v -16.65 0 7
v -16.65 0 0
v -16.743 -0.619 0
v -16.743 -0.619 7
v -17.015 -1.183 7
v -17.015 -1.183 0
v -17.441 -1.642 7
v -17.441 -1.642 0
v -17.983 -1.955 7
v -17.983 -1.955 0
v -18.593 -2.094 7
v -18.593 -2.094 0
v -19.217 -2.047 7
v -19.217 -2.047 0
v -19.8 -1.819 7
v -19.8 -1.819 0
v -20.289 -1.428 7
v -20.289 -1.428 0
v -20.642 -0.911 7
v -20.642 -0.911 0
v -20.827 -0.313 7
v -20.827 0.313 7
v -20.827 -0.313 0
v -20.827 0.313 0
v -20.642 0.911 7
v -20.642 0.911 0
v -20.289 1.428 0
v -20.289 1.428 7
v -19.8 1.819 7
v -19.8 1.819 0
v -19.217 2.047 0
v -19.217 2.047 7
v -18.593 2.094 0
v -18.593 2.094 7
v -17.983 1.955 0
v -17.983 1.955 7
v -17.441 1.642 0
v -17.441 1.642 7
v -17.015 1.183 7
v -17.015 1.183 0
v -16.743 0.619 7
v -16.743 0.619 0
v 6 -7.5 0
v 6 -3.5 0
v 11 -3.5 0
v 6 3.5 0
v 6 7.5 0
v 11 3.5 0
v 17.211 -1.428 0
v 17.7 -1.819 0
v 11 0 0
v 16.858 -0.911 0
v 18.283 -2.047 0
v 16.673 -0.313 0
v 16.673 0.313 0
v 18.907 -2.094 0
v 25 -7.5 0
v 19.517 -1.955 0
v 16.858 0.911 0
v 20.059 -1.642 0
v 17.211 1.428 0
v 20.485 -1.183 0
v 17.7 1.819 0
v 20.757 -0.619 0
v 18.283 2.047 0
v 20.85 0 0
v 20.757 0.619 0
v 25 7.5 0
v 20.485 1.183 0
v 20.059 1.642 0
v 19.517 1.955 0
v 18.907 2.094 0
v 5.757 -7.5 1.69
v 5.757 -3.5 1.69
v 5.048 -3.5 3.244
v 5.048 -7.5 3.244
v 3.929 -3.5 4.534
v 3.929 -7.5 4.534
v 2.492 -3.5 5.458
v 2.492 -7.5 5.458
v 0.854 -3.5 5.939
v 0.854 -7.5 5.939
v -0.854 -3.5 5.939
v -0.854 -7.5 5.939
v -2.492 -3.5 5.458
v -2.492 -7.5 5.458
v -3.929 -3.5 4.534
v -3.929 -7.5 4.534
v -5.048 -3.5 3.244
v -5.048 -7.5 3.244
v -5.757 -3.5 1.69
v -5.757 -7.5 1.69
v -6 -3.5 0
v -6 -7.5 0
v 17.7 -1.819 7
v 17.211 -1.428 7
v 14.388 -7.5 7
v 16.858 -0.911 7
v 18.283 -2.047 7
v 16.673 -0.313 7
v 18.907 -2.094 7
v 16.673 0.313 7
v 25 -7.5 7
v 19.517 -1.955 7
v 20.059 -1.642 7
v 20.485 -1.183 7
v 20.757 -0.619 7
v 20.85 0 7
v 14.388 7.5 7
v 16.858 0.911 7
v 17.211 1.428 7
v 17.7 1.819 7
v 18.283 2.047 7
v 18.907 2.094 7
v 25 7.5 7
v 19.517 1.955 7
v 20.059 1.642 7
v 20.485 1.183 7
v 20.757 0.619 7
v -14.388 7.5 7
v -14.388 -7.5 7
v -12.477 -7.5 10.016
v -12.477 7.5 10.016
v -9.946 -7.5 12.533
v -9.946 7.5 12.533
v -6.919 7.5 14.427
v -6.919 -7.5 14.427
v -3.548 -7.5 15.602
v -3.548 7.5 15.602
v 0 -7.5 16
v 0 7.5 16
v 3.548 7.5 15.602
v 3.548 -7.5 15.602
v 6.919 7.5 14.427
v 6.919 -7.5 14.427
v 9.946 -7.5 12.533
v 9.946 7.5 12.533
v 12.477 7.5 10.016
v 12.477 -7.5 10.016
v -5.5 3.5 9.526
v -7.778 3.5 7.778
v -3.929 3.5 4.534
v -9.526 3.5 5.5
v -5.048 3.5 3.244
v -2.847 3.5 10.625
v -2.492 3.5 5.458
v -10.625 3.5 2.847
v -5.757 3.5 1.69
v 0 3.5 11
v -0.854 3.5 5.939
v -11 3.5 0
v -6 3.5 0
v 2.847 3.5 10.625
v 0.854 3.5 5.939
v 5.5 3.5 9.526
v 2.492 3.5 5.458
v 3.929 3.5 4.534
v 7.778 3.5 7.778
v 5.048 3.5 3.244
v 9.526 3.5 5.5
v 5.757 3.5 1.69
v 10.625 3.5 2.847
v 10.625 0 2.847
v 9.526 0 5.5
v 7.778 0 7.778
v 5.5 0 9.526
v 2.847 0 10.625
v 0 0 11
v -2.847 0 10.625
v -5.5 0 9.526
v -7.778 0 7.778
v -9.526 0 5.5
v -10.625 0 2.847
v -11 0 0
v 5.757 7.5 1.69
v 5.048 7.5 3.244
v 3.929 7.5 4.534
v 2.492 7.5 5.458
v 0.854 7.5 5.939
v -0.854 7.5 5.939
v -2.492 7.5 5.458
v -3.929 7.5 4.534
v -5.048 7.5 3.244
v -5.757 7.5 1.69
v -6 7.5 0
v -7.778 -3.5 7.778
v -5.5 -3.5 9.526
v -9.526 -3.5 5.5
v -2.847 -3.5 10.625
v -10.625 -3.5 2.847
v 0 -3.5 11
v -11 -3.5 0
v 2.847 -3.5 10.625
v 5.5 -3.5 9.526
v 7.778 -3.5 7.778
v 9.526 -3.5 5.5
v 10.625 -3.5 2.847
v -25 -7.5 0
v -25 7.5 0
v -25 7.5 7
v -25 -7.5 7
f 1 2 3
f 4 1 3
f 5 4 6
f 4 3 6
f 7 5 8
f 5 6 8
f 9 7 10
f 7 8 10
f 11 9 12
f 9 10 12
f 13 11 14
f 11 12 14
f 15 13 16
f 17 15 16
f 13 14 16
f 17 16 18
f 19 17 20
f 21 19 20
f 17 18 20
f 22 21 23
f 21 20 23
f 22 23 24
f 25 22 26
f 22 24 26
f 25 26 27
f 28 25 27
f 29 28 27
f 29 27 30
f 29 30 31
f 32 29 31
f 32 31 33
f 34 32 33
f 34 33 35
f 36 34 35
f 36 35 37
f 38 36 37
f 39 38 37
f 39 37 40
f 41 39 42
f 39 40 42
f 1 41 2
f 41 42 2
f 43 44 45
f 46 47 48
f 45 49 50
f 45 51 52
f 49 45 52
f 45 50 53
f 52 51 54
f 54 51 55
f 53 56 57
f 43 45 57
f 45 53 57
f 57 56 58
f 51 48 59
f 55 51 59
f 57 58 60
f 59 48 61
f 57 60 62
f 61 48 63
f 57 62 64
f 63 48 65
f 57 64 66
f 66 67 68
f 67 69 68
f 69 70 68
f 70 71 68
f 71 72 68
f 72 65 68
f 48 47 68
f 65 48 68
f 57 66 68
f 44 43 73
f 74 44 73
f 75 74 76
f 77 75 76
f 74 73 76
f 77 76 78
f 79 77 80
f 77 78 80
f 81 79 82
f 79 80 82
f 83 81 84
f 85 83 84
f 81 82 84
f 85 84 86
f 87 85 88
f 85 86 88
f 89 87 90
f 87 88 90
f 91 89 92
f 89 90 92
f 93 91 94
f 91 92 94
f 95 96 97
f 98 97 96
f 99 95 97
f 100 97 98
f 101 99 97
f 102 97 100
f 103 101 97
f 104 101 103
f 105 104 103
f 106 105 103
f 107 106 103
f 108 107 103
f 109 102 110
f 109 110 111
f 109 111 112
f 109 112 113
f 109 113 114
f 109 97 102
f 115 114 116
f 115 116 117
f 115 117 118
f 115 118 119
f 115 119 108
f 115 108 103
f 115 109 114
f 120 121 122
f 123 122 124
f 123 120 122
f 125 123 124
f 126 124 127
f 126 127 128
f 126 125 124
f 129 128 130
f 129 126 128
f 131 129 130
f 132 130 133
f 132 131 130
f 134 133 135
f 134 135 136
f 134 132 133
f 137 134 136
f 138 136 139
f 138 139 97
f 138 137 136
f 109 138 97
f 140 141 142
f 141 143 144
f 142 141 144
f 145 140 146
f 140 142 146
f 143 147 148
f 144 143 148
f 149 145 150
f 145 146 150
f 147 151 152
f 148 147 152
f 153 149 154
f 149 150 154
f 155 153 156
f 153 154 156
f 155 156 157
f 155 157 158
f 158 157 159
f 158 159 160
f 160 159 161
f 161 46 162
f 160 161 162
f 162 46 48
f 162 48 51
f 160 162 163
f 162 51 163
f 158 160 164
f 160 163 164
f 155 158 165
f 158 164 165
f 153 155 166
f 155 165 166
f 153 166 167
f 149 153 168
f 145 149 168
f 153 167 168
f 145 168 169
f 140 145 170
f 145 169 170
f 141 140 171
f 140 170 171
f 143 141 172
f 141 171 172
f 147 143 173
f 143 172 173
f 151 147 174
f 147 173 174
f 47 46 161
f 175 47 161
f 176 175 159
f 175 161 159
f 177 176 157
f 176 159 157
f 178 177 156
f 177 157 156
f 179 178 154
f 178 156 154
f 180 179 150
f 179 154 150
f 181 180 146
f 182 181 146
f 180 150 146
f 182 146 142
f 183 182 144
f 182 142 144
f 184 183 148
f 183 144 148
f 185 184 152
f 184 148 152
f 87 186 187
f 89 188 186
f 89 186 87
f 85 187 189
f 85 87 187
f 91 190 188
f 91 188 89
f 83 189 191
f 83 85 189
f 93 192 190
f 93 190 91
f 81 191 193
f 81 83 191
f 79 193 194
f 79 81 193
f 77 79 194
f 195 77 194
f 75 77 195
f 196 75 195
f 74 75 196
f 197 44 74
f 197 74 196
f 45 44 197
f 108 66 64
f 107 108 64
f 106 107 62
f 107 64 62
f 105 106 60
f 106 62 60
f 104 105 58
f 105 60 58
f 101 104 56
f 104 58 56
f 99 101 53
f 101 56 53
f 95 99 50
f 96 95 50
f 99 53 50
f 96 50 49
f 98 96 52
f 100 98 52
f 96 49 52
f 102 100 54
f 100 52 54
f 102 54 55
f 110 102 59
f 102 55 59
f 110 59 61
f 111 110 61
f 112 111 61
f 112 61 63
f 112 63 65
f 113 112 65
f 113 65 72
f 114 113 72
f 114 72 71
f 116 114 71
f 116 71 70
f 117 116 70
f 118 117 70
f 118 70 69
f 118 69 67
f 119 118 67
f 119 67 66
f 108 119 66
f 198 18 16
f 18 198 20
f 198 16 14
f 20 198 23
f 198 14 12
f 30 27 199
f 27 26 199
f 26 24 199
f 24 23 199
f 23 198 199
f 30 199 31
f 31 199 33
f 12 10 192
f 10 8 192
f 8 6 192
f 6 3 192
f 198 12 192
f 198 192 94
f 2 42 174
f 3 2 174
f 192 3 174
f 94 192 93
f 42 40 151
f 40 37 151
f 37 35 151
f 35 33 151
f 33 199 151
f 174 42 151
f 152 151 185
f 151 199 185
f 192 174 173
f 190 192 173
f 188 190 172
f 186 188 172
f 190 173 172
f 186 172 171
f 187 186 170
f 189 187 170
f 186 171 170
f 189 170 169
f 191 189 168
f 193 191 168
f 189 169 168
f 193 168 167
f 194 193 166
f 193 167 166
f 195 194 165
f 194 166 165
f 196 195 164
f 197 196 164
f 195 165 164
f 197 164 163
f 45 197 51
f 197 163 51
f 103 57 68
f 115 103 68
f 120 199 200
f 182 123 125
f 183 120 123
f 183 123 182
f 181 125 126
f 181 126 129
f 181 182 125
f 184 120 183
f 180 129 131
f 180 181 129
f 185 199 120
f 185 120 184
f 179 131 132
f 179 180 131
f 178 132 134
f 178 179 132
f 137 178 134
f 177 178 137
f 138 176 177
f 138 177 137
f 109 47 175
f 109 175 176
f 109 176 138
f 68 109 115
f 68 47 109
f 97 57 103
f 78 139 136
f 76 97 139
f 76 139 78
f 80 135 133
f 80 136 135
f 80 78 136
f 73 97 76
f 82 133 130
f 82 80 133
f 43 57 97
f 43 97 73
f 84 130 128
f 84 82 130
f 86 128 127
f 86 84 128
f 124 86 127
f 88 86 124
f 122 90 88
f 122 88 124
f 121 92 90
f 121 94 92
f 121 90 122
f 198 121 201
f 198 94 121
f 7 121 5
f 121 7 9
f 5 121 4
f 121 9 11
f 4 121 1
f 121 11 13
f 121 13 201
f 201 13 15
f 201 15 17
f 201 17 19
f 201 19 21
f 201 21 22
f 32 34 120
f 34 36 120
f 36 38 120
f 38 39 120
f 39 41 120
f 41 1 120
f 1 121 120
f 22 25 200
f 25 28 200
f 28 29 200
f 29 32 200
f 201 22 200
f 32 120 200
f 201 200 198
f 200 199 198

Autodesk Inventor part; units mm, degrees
ref_plane "YZ Plane" through (0, 0, 0) normal (1, 0, 0) x (0, 1, 0)
ref_plane "XZ Plane" through (0, 0, 0) normal (0, 1, 0) x (-1, 0, 0)
ref_plane "XY Plane" through (0, 0, 0) normal (0, 0, 1) x (1, 0, 0)
sketch "Skizze1" plane through (0, 0, 0) normal (0, 0, 1) x (1, 0, 0)
  circle A0 centre (-18.75, 0) radius 2.1 projected
  line L0 (-6.25, 7.5) -> (-6.25, 3.5) projected
  line L1 (-6.25, 7.5) -> (-25, 7.5) projected
  line L2 (-25, 7.5) -> (-25, -7.5) projected
  line L3 (-25, -7.5) -> (-6.25, -7.5) projected
  line L4 (-6.25, -3.5) -> (-6.25, -7.5) projected
  line L5 (-11, -3.5) -> (-6.25, -3.5) projected
  line L6 (-11, 3.5) -> (-11, -3.5) projected
  line L7 (-6.25, 3.5) -> (-11, 3.5) projected
  circle A1 centre (18.75, 0) radius 2.1 projected
  line L8 (6.25, 3.5) -> (6.25, 7.5) projected
  line L9 (11, 3.5) -> (6.25, 3.5) projected
  line L10 (11, -3.5) -> (11, 3.5) projected
  line L11 (6.25, -3.5) -> (11, -3.5) projected
  line L12 (6.25, -7.5) -> (6.25, -3.5) projected
  line L13 (6.25, -7.5) -> (25, -7.5) projected
  line L14 (25, -7.5) -> (25, 7.5) projected
  line L15 (25, 7.5) -> (6.25, 7.5) projected
  line L16 (-25, 7.5) -> (25, 7.5)
  line L17 (25, 7.5) -> (25, -7.5)
  line L18 (25, -7.5) -> (-25, -7.5)
  line L19 (-25, -7.5) -> (-25, 7.5)
  line L20 (-25, 7.5) -> (25, -7.5) construction
  line L21 (25, 7.5) -> (-25, -7.5) construction
  point P0 (0, 0)
extrude "Extrusion1" add sketch "Skizze1" along normal blind 16
sketch "Skizze2" plane through (-25, -7.5, 0) normal (0, -1, 0) x (1, 0, 0)
  point P0 (25, 0)
ref_plane "Arbeitsebene1" through (-25, 0, 0) normal (0, 1, 0) x (1, 0, 0)
sketch "Skizze3" plane through (-25, 0, 0) normal (0, 1, 0) x (1, 0, 0)
  line L0 (8.35, -16) -> (8.35, 0) projected
  line L1 (8.35, 0) -> (41.65, 0) projected
  line L2 (41.65, 0) -> (41.65, -16) projected
  line L3 (41.65, -16) -> (8.35, -16) projected
  line L4 (0, -16) -> (0, 0) projected
  line L5 (0, 0) -> (4.15, 0) projected
  line L6 (4.15, 0) -> (4.15, -16) projected
  line L7 (4.15, -16) -> (0, -16) projected
  line L8 (50, 0) -> (50, -16) projected
  line L9 (50, -16) -> (45.85, -16) projected
  line L10 (45.85, -16) -> (45.85, 0) projected
  line L11 (45.85, 0) -> (50, 0) projected
  circle A0 centre (25, 0) radius 11
  dimension "d2" = 22
extrude "Extrusion2" cut sketch "Skizze3" along normal mid plane 7 contours A0 L1 | L1 A0
sketch "Skizze4" plane through (-25, 7.5, 0) normal (0, 1, 0) x (1, 0, 0)
  line L0 (50, 0) -> (50, -16) projected
  line L1 (50, -16) -> (0, -16) projected
  line L2 (0, -16) -> (0, 0) projected
  line L3 (0, 0) -> (50, 0) projected
  line L4 (50, 0) -> (50, -16) projected
  line L5 (50, -16) -> (0, -16) projected
  line L6 (0, -16) -> (0, 0) projected
  line L7 (0, 0) -> (50, 0) projected
  line L8 (50, 0) -> (50, -16) projected
  line L9 (50, -16) -> (0, -16) projected
  line L10 (0, -16) -> (0, 0) projected
  line L11 (0, 0) -> (50, 0) projected
  line L12 (50, 0) -> (50, -16) projected
  line L13 (50, -16) -> (0, -16) projected
  line L14 (0, -16) -> (0, 0) projected
  line L15 (0, 0) -> (50, 0) projected
  line L16 (14, 0) -> (36, 0) projected
  arc A0 (14, 0) -> (36, 0) centre (25, 0) ccw projected
  arc A1 (10.6125, -7) -> (39.3875, -7) centre (25, 0) ccw
  line L17 (50, -16) -> (0, -16) projected
  line L18 (39.3875, -7) -> (50, -7)
  line L19 (10.6125, -7) -> (0, -7)
  dimension "d5" = 7
extrude "Extrusion3" cut sketch "Skizze4" against normal through all contours L0 L1 A1 L18 | L1 L2 L19 A1
sketch "Skizze5" plane through (-25, -7.5, 0) normal (0, -1, 0) x (1, 0, 0)
  circle A0 centre (25, 0) radius 6
  dimension "d8" = 12
extrude "Extrusion4" cut sketch "Skizze5" against normal through all
properties part number "LagerKlemme" material "ABS-Kunststoff"
